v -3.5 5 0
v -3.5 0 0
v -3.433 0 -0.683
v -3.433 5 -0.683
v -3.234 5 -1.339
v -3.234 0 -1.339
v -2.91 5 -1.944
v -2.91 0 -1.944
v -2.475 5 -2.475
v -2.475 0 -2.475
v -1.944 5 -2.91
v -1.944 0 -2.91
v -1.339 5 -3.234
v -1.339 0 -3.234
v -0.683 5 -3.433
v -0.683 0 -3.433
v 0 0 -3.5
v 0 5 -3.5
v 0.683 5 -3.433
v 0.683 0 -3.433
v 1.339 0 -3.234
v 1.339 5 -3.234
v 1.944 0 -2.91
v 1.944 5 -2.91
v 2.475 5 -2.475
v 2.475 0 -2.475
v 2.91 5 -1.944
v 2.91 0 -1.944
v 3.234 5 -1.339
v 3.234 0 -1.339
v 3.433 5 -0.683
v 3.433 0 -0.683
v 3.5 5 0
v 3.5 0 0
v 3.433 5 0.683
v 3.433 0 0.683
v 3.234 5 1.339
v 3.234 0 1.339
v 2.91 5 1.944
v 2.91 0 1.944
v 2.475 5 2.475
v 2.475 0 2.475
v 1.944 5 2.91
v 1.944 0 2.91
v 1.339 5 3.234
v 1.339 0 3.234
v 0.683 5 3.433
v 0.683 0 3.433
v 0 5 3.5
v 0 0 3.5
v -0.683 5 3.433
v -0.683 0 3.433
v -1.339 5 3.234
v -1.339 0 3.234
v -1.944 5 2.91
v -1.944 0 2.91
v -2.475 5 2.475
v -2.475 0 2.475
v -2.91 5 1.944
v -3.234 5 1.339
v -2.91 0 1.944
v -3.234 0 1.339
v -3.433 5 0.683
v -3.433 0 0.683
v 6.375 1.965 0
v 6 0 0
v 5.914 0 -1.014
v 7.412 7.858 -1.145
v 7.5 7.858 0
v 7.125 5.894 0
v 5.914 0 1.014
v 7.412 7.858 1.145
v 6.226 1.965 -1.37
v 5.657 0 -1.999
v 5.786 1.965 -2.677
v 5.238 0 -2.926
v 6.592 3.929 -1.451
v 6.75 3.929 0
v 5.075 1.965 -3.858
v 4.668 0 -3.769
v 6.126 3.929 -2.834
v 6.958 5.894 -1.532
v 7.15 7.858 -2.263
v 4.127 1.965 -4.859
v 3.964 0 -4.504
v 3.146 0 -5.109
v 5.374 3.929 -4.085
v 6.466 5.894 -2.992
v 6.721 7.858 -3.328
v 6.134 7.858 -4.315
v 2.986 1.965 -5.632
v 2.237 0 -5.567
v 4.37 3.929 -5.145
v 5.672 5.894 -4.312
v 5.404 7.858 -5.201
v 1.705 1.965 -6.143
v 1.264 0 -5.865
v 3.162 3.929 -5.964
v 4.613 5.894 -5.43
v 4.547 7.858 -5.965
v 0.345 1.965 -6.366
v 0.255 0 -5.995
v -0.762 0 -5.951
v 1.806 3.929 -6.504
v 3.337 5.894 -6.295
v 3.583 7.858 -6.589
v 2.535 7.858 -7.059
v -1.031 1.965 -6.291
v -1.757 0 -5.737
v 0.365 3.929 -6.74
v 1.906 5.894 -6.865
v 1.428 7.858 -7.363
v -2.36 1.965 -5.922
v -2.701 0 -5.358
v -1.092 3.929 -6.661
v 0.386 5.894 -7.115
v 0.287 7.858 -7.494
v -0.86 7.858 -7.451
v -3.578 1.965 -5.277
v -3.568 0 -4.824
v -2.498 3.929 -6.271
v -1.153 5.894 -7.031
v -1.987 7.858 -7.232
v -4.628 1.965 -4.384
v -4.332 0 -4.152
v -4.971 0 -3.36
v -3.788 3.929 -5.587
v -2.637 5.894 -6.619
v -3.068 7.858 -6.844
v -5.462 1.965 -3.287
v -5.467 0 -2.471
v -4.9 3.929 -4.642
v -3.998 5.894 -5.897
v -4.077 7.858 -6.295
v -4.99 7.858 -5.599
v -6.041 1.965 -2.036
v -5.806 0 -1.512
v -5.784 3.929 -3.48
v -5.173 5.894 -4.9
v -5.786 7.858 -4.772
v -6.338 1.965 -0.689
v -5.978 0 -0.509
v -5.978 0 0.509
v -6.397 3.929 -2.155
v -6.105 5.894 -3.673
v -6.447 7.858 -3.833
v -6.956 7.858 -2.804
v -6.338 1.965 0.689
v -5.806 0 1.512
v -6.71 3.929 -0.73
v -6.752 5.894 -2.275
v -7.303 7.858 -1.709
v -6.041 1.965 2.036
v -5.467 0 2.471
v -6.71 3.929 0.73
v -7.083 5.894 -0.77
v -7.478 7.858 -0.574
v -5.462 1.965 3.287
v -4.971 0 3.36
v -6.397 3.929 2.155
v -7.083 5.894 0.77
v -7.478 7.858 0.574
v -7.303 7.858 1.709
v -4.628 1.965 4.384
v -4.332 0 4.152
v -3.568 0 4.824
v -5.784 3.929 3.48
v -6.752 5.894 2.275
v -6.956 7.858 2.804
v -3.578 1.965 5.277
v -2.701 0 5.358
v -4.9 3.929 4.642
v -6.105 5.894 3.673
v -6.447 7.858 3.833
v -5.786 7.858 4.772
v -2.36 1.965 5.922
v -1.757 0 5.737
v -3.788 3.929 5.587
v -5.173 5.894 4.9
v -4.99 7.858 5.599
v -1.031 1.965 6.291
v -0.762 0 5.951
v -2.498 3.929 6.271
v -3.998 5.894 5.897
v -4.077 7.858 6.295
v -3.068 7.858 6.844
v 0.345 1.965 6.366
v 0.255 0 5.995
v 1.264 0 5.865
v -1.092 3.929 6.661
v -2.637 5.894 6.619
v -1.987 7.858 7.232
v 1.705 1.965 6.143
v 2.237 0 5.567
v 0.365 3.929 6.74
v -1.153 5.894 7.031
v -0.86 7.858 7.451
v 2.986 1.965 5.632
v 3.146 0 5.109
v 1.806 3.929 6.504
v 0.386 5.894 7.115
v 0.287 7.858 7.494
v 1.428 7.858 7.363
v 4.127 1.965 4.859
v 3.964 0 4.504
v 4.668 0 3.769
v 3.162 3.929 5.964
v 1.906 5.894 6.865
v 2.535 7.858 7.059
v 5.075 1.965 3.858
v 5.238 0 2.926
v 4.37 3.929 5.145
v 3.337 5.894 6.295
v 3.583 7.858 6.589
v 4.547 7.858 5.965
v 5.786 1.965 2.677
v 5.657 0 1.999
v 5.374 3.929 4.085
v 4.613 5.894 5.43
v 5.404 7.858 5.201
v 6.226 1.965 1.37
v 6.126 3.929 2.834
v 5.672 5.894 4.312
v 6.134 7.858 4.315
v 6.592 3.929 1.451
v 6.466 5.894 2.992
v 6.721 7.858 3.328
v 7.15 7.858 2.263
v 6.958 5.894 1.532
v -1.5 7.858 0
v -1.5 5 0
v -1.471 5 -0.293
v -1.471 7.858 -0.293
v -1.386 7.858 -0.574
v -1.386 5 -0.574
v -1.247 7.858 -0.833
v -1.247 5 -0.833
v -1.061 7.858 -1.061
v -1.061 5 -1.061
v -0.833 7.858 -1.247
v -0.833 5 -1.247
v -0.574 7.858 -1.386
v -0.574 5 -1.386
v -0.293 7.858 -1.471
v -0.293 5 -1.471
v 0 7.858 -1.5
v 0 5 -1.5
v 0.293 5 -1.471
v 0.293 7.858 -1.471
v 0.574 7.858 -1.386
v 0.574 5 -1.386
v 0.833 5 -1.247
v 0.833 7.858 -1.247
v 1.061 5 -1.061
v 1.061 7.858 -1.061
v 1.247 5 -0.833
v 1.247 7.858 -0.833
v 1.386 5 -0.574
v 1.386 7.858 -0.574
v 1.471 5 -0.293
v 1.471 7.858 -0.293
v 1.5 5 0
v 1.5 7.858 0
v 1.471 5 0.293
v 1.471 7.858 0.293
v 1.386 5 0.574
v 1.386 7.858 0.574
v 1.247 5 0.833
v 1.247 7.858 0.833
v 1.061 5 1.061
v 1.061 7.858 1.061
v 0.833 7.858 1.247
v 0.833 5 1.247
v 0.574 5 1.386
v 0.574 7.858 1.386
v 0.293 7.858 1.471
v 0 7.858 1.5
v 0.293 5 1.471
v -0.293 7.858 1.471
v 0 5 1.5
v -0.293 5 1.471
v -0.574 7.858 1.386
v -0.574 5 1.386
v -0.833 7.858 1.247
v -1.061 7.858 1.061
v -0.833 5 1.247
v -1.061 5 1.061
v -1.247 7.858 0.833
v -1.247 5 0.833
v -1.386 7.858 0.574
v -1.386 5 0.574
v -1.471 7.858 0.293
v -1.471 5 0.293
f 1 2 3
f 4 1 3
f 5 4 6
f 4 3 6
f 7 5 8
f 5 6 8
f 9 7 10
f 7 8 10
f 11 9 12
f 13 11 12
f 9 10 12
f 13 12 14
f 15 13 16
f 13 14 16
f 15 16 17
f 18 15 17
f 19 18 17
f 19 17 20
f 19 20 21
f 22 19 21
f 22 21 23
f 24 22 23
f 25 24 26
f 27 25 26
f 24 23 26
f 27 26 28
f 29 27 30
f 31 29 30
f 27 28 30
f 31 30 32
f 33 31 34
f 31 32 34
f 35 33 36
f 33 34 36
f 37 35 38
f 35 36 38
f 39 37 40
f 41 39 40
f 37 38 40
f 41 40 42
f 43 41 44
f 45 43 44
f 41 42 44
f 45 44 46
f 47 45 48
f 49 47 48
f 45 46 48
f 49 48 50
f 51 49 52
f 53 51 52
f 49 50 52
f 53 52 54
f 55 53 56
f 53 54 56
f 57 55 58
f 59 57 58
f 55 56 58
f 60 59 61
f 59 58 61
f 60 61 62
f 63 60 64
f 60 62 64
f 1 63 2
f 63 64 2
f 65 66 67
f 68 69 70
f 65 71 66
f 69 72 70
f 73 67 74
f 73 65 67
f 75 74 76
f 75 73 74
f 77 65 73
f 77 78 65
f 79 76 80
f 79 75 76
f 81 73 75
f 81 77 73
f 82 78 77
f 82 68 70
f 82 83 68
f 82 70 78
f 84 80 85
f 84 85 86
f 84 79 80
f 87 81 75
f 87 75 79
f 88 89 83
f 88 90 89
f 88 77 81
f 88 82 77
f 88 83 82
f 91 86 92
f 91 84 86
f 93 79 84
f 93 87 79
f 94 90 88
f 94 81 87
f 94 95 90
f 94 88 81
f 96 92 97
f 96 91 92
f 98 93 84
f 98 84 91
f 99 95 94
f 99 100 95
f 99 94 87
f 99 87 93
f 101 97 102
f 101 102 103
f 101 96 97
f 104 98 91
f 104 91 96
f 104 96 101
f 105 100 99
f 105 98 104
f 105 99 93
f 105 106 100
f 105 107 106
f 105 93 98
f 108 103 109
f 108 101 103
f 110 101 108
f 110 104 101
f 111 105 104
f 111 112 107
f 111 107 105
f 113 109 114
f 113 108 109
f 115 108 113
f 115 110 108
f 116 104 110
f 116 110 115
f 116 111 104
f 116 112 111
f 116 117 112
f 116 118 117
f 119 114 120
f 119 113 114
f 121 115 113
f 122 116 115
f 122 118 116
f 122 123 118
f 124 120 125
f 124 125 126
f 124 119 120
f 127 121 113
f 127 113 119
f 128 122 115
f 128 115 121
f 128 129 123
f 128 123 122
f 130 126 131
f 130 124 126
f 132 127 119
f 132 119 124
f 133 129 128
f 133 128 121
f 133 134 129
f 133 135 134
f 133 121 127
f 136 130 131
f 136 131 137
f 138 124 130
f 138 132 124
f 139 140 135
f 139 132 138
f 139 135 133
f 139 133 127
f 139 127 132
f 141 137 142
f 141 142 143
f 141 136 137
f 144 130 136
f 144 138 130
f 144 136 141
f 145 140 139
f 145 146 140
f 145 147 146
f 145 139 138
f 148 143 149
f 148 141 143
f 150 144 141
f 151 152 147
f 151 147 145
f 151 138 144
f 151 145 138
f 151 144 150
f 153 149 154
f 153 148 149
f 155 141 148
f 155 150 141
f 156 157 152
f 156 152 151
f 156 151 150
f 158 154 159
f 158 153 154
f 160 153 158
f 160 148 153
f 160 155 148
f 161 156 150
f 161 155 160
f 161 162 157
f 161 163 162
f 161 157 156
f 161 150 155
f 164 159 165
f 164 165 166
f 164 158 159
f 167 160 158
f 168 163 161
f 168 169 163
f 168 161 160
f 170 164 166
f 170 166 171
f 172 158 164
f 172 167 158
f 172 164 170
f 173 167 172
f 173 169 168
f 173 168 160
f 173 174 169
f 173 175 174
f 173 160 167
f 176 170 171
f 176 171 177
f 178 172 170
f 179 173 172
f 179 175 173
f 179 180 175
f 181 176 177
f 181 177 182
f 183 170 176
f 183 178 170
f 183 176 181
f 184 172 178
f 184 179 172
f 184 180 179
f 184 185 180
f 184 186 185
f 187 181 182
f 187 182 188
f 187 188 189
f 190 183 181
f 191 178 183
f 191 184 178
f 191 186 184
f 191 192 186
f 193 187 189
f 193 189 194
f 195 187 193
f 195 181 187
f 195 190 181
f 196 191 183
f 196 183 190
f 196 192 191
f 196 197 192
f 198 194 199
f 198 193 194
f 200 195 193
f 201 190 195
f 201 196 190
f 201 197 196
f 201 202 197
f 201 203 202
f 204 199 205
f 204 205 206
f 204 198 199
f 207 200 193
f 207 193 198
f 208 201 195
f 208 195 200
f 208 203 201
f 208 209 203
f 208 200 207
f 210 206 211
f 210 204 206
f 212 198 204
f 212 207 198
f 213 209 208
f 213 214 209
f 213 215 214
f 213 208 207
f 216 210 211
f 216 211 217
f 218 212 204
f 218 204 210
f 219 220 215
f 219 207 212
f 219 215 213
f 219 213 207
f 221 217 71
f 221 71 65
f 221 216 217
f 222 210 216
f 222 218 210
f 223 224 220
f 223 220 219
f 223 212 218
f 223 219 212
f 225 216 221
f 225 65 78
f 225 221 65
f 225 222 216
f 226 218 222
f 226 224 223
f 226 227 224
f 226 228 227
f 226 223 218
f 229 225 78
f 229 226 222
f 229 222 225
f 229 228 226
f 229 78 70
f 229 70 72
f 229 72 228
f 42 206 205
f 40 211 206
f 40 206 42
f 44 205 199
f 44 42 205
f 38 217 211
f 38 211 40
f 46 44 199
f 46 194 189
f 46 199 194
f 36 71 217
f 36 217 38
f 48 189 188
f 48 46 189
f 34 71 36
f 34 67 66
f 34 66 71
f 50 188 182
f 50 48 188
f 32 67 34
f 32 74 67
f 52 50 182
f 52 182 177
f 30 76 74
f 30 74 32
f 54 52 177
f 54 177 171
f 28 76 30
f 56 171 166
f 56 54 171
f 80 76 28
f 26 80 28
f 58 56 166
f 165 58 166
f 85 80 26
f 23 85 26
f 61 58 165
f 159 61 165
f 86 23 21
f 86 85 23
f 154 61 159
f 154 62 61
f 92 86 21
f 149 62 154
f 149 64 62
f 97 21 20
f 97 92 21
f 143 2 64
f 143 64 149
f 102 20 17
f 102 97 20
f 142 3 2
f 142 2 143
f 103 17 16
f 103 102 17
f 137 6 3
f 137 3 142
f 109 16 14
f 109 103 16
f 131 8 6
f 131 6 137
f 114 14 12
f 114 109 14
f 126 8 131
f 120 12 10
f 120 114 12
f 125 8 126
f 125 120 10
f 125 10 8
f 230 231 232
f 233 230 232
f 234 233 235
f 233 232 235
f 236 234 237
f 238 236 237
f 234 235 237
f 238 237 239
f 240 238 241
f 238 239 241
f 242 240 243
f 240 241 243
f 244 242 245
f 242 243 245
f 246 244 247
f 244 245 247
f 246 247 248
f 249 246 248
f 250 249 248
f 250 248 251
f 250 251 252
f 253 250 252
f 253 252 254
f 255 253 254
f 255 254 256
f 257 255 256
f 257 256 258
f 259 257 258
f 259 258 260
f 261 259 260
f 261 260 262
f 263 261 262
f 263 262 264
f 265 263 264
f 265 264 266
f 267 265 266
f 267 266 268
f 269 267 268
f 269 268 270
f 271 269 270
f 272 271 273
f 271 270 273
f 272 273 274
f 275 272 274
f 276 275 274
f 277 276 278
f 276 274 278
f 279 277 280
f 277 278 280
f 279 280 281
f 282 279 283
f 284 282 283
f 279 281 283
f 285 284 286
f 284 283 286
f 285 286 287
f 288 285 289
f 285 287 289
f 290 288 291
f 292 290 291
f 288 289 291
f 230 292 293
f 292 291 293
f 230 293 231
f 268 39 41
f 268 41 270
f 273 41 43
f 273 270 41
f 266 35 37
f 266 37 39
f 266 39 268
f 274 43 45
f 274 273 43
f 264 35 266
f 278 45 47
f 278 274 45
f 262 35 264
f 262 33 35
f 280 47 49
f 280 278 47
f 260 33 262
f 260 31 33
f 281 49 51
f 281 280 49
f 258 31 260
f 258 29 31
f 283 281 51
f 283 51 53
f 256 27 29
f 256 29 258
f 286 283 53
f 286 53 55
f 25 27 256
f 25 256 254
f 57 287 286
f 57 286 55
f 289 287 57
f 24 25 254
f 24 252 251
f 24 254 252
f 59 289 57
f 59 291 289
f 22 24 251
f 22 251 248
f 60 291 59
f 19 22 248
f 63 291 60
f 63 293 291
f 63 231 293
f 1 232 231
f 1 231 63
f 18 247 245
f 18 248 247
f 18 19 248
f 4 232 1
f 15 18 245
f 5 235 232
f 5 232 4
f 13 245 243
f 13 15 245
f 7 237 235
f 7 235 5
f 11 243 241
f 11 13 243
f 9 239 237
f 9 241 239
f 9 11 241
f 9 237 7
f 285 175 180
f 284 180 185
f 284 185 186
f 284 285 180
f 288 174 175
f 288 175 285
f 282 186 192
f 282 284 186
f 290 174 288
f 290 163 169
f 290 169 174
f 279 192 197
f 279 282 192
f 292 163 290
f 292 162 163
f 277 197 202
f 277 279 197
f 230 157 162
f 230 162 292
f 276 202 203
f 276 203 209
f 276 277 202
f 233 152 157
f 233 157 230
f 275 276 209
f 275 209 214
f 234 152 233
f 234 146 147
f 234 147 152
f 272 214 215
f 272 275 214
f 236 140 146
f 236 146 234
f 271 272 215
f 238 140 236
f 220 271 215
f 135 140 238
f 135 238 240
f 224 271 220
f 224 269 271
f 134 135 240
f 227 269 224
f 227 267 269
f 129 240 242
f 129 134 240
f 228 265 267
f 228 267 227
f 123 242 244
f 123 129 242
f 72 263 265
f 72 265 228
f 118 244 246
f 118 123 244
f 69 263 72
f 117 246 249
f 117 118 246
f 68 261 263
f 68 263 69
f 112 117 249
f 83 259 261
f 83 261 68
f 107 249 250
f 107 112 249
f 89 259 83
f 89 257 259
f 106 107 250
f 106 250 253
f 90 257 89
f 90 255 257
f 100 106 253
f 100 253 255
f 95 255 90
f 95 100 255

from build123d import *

# Parameters (mm, degrees)
SKETCH3_R          = 1.5
CUT_EXTRUDE1_DEPTH = 8.858116823
SKETCH4_R          = 3.5
CUT_EXTRUDE2_DEPTH = 5


with BuildPart() as part:
    # Sketch2 → Revolve1 (revolve)
    with BuildSketch(Plane.XY):
        Polygon((0, 0), (6, 0), (7.5, 7.858116823), (0, 7.858116823), align=None)
    revolve(axis=Axis((0, 0, 0), (0, 1, 0)))

    # Sketch3 → Cut-Extrude1 (cut, through all)
    with BuildSketch(Plane(origin=(0, 0, 0), x_dir=(-1, 0, 0), z_dir=(0, -1, 0))):
        Circle(SKETCH3_R)
    extrude(amount=-CUT_EXTRUDE1_DEPTH, mode=Mode.SUBTRACT)

    # Sketch4 → Cut-Extrude2 (cut)
    with BuildSketch(Plane(origin=(0, 0, 0), x_dir=(-1, 0, 0), z_dir=(0, -1, 0))):
        Circle(SKETCH4_R)
    extrude(amount=-CUT_EXTRUDE2_DEPTH, mode=Mode.SUBTRACT)


solid = part.part
